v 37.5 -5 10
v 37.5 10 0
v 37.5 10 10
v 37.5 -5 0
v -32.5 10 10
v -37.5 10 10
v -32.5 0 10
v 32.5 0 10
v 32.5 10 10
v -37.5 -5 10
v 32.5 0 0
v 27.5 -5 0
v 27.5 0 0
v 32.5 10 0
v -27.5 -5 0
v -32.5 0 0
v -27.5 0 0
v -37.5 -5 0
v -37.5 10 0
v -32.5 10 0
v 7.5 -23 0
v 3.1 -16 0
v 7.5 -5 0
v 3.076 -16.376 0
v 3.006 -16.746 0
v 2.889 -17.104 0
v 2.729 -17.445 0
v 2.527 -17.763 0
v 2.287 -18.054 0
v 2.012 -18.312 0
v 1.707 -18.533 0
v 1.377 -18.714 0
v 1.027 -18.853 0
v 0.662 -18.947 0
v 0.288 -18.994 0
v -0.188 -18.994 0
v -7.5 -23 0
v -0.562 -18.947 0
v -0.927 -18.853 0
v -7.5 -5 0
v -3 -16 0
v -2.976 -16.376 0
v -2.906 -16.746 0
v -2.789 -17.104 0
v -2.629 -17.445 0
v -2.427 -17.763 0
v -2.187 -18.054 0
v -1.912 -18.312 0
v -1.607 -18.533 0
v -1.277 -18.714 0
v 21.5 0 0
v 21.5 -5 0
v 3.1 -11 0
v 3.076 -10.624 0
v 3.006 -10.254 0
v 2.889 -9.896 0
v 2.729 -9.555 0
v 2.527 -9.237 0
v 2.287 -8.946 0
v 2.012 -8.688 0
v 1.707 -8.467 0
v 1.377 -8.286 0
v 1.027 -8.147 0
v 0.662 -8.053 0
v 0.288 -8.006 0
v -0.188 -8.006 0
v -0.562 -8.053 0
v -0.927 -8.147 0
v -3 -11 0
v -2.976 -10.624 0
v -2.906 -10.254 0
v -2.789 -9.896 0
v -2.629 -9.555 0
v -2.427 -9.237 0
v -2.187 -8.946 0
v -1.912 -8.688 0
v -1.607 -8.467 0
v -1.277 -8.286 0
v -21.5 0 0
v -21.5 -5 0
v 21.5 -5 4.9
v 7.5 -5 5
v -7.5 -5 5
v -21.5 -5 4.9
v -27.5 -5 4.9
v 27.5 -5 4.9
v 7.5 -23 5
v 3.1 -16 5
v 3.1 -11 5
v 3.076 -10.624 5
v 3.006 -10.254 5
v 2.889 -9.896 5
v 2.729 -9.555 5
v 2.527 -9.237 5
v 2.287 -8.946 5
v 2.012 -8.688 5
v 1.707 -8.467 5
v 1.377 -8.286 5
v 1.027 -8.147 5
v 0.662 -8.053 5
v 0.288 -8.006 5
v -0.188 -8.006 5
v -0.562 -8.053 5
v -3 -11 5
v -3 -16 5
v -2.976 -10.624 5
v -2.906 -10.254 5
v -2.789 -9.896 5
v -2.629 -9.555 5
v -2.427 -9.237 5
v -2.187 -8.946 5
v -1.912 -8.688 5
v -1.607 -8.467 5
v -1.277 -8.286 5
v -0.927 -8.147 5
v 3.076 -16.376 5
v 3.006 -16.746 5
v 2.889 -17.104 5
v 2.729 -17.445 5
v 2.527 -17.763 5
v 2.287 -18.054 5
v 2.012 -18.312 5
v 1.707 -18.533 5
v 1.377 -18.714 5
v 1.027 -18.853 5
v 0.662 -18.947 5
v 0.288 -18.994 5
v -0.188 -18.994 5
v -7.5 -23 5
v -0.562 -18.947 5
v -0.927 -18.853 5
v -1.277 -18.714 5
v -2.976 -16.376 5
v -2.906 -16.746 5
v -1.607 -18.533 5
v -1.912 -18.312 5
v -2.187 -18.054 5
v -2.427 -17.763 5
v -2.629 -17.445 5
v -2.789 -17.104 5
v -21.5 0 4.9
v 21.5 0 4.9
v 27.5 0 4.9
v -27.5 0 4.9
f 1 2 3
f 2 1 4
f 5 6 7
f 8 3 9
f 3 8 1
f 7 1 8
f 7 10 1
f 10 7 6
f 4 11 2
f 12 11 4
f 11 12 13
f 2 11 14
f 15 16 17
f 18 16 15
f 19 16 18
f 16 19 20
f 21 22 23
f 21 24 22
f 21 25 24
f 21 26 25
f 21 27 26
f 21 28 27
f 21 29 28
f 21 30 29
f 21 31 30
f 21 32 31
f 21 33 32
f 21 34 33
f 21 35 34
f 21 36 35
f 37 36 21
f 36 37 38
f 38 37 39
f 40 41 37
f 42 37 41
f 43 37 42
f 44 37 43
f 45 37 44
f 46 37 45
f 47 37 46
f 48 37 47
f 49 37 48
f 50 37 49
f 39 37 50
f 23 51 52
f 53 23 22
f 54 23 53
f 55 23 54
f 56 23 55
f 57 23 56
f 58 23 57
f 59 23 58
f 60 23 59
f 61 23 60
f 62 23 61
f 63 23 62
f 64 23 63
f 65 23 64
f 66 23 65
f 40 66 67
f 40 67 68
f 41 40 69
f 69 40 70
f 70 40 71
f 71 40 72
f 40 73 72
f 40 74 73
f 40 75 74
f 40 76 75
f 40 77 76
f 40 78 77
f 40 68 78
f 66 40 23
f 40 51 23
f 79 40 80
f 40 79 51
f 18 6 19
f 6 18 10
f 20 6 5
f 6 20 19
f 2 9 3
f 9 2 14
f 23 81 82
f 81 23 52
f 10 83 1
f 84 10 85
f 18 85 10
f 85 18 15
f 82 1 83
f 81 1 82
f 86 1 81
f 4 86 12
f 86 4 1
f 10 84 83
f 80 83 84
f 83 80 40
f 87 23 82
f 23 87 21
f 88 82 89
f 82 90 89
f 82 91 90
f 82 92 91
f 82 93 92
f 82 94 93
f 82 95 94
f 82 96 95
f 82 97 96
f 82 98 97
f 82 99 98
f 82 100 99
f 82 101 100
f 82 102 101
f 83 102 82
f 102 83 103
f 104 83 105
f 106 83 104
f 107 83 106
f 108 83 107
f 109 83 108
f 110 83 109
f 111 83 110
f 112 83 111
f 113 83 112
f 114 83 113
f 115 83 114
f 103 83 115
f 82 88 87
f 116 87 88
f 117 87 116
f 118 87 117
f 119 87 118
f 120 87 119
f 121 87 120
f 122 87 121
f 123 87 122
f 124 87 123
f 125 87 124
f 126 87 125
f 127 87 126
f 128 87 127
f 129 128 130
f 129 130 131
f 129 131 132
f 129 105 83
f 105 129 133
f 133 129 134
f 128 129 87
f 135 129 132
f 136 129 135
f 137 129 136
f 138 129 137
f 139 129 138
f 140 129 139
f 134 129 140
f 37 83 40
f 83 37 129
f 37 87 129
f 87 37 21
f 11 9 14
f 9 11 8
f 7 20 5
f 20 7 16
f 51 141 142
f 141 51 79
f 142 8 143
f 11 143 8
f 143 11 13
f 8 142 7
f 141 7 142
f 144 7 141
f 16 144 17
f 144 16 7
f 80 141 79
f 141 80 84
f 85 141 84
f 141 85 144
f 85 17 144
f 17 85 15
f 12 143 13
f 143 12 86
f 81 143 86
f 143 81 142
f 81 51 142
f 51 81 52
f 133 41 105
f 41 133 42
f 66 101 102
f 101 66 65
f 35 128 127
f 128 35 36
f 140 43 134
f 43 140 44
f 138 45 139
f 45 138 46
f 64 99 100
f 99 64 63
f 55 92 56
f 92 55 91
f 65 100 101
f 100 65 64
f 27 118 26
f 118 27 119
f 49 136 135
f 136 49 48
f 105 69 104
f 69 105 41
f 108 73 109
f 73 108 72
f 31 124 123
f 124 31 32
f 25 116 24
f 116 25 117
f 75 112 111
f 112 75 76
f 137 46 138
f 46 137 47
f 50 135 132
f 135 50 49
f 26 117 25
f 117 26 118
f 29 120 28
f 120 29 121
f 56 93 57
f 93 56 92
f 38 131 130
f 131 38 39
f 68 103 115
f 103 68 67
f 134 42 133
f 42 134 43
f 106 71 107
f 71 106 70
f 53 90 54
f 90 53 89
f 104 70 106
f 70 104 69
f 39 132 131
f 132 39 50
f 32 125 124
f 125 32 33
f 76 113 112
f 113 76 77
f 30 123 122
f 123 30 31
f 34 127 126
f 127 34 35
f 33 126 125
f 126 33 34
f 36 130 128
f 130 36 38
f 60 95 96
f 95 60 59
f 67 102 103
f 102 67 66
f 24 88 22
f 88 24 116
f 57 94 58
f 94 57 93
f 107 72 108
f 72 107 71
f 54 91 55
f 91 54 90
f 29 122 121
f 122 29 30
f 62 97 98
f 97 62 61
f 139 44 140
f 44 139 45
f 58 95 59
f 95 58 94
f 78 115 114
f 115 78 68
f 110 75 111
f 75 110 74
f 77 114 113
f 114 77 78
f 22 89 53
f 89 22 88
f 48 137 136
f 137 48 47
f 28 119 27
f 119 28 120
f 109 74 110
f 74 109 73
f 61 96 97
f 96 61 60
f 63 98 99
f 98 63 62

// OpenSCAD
$fn = 50;

difference() {
  
  union() {
    translate([-75 / 2, -5, 0])
      cube([75, 15, 10]);
    
    translate([-15 / 2, -23, 0])
      cube([15, 25, 5]);
  }

  translate([-65 /2 , 0, -0.1])
    cube([65, 111, 32]);

  translate([-65 /2 + 5 , -10, -0.1])
    cube([6, 15, 5]);
  
  translate([65 /2 - 6 - 5 , -10, -0.1])
    cube([6, 15, 5]);

  translate([0, -16, -0.1])
    minkowski() {
      cube([0.1, 5, 1]);
      
      cylinder(10, 3, 3);
    }
}



*translate([-65 /2 + 0.5, 0, 0])
  difference() {
    union() {
      cube([5, 120, 37]);

      translate([0, -5, 0])
        cube([5, 130, 5]);
    }
    
    translate([-65 / 2, 5, -0.1])
      cube([65, 111, 32]);

  }
